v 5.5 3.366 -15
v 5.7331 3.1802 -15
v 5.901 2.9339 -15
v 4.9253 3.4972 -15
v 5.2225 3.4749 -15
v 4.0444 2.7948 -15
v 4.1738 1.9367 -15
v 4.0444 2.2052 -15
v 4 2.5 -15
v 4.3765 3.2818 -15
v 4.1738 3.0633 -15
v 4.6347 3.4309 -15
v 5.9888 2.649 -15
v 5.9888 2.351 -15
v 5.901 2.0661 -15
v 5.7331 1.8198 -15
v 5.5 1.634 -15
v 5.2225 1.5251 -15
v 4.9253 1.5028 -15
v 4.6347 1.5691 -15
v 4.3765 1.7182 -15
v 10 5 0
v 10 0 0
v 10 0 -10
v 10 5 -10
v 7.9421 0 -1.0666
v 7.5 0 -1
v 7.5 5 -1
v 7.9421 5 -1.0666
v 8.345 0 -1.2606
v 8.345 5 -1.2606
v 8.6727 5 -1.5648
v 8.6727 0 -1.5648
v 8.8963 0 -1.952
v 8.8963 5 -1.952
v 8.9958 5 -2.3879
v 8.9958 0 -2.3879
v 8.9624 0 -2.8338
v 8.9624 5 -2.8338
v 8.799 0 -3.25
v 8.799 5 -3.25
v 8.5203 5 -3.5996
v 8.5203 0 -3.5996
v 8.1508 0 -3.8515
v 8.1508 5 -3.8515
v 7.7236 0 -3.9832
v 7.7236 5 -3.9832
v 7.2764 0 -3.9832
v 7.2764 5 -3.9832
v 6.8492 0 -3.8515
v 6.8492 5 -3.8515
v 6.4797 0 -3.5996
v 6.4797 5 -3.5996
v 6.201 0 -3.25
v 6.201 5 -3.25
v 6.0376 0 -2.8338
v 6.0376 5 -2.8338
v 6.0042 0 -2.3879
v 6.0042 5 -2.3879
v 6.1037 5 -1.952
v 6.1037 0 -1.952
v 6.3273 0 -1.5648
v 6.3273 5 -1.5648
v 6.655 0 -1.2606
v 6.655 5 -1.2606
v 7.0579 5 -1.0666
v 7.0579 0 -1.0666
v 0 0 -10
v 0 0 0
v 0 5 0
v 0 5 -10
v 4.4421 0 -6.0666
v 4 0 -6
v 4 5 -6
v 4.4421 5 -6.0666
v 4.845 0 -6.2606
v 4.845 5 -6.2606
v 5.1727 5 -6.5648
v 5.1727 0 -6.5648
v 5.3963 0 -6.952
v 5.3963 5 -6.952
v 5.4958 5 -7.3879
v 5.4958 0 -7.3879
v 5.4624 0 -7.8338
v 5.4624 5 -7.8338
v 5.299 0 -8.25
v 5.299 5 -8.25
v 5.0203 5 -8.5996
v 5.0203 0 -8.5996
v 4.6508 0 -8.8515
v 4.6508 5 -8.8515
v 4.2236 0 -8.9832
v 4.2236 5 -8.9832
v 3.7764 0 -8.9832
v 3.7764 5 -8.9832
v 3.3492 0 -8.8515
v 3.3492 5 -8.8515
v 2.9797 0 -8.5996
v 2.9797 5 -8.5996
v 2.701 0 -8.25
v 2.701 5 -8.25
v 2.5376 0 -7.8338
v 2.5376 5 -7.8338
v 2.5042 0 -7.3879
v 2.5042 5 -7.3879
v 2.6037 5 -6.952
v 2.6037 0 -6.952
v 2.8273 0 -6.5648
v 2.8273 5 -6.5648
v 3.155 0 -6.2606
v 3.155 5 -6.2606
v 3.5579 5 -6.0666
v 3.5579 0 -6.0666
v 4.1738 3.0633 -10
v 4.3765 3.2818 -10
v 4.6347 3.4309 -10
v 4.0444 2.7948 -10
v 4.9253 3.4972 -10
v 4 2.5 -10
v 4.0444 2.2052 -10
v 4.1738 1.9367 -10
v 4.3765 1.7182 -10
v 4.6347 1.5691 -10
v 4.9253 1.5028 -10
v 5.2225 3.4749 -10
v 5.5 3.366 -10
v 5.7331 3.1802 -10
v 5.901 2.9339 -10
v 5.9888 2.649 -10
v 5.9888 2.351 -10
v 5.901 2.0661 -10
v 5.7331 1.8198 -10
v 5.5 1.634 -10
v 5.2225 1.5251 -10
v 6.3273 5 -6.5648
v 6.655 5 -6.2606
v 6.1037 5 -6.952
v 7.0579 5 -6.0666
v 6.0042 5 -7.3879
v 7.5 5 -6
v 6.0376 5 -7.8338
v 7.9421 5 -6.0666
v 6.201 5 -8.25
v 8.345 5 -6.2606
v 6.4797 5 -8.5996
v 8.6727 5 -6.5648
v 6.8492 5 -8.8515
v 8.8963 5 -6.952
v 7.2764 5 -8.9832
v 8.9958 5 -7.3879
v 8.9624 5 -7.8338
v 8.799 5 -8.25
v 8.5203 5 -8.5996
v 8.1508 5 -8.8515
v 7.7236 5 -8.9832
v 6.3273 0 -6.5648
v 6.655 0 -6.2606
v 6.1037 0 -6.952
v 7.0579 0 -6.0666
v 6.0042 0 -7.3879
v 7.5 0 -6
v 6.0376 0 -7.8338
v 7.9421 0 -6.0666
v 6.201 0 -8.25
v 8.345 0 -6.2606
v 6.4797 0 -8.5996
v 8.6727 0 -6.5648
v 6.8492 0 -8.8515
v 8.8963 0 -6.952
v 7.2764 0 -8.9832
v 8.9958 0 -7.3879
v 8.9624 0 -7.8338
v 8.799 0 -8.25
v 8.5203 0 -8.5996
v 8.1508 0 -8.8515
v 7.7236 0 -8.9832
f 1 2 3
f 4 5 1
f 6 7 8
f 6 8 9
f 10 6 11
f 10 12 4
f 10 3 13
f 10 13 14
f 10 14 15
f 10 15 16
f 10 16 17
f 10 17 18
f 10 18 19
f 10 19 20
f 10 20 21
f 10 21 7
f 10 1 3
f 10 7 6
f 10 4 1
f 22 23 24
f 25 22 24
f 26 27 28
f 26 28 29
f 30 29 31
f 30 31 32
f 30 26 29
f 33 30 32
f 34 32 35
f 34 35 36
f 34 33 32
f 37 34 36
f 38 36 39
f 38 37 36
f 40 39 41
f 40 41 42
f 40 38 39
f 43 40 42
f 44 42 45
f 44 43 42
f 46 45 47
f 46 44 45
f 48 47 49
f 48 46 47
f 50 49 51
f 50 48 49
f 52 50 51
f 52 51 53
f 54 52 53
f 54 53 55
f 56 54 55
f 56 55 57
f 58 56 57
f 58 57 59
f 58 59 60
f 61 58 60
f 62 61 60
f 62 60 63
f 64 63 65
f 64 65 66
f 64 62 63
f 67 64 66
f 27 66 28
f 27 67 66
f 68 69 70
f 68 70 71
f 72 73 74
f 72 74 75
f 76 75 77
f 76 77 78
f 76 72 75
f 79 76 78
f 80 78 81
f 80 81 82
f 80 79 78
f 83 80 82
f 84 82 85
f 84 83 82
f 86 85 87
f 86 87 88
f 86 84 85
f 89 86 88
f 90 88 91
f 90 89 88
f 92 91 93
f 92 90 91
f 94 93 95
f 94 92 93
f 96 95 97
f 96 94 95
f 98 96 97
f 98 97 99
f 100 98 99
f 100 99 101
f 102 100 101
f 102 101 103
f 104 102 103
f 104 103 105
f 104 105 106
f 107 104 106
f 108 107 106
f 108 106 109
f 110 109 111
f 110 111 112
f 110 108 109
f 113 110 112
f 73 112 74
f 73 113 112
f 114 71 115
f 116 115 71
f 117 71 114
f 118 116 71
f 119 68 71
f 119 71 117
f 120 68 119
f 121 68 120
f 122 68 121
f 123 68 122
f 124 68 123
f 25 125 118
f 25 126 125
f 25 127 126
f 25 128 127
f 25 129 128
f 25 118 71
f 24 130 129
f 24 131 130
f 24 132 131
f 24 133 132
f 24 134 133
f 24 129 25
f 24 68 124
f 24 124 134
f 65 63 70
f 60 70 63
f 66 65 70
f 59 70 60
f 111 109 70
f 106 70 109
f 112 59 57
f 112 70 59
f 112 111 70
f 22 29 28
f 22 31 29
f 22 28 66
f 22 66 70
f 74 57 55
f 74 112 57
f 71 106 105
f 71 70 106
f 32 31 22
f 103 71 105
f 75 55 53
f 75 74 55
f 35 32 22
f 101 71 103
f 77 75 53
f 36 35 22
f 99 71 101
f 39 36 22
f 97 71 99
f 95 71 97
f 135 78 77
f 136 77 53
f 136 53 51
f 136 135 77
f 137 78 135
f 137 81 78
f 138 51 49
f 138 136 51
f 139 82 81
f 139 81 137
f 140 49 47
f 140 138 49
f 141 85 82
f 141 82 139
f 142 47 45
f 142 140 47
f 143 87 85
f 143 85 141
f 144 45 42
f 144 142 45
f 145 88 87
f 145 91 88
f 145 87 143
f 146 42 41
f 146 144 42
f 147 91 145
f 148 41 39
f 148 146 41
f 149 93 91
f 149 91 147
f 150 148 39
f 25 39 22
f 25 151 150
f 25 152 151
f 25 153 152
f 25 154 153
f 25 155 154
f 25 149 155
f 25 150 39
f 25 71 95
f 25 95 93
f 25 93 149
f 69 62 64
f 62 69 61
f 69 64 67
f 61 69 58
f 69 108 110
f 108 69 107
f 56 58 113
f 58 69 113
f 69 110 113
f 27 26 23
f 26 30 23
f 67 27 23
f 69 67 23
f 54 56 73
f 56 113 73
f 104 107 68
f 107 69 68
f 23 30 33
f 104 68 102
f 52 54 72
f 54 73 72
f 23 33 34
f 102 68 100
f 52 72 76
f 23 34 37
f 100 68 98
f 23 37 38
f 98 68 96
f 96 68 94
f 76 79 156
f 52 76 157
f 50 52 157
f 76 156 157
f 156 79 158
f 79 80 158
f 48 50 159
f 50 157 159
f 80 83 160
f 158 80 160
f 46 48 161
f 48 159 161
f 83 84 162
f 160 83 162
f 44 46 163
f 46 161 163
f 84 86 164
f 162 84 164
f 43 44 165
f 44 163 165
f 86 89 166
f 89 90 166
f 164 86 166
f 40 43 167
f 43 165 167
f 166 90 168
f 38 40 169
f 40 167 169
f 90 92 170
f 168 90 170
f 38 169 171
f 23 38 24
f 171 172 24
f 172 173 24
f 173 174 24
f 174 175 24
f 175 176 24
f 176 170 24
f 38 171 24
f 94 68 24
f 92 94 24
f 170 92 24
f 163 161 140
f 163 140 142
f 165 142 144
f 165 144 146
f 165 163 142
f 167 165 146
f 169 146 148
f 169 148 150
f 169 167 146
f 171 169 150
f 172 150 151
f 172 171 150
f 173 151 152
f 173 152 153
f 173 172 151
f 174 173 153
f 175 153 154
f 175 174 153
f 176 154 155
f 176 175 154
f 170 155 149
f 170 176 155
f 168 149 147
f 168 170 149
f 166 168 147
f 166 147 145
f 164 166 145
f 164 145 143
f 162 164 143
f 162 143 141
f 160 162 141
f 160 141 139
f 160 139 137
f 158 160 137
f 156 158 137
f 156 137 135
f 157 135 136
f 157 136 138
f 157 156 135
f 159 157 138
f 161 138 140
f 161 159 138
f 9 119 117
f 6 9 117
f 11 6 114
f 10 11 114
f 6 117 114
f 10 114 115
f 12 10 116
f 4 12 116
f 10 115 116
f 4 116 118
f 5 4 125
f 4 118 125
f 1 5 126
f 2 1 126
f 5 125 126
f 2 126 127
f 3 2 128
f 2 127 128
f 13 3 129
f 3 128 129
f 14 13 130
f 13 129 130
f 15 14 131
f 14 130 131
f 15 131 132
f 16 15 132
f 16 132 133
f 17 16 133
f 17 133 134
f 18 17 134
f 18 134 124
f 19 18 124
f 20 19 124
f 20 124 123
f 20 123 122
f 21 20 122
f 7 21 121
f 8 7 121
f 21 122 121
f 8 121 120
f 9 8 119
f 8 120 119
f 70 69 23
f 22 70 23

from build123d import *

# Parameters (mm, degrees)
SKETCH_1_W      = 10
SKETCH_1_H      = 10
SKETCH_1_R      = 1.5
EXTRUDE_1_DEPTH = 5
SKETCH_2_R      = 1
EXTRUDE_2_DEPTH = 5


with BuildPart() as part:
    # 草图1 → 凸台-拉伸1 (new body)
    with BuildSketch(Plane(origin=(0, 0, 0), x_dir=(1, 0, 0), z_dir=(0, 1, 0))):
        with Locations((5, 5)):
            Rectangle(SKETCH_1_W, SKETCH_1_H)
        with Locations(Location((7.5, 7.5, 0), (0, 0, 270))):
            Circle(SKETCH_1_R, mode=Mode.SUBTRACT)
        with Locations(Location((7.5, 2.5, 0), (0, 0, 270))):
            Circle(SKETCH_1_R, mode=Mode.SUBTRACT)
        with Locations(Location((4, 7.5, 0), (0, 0, 270))):
            Circle(SKETCH_1_R, mode=Mode.SUBTRACT)
    extrude(amount=EXTRUDE_1_DEPTH)

    # 草图2 → 凸台-拉伸2 (add)
    with BuildSketch(Plane(origin=(0, 0, -10), x_dir=(-1, 0, 0), z_dir=(0, 0, -1))):
        with Locations((-5, 2.5)):
            Circle(SKETCH_2_R)
    extrude(amount=EXTRUDE_2_DEPTH)


solid = part.part
